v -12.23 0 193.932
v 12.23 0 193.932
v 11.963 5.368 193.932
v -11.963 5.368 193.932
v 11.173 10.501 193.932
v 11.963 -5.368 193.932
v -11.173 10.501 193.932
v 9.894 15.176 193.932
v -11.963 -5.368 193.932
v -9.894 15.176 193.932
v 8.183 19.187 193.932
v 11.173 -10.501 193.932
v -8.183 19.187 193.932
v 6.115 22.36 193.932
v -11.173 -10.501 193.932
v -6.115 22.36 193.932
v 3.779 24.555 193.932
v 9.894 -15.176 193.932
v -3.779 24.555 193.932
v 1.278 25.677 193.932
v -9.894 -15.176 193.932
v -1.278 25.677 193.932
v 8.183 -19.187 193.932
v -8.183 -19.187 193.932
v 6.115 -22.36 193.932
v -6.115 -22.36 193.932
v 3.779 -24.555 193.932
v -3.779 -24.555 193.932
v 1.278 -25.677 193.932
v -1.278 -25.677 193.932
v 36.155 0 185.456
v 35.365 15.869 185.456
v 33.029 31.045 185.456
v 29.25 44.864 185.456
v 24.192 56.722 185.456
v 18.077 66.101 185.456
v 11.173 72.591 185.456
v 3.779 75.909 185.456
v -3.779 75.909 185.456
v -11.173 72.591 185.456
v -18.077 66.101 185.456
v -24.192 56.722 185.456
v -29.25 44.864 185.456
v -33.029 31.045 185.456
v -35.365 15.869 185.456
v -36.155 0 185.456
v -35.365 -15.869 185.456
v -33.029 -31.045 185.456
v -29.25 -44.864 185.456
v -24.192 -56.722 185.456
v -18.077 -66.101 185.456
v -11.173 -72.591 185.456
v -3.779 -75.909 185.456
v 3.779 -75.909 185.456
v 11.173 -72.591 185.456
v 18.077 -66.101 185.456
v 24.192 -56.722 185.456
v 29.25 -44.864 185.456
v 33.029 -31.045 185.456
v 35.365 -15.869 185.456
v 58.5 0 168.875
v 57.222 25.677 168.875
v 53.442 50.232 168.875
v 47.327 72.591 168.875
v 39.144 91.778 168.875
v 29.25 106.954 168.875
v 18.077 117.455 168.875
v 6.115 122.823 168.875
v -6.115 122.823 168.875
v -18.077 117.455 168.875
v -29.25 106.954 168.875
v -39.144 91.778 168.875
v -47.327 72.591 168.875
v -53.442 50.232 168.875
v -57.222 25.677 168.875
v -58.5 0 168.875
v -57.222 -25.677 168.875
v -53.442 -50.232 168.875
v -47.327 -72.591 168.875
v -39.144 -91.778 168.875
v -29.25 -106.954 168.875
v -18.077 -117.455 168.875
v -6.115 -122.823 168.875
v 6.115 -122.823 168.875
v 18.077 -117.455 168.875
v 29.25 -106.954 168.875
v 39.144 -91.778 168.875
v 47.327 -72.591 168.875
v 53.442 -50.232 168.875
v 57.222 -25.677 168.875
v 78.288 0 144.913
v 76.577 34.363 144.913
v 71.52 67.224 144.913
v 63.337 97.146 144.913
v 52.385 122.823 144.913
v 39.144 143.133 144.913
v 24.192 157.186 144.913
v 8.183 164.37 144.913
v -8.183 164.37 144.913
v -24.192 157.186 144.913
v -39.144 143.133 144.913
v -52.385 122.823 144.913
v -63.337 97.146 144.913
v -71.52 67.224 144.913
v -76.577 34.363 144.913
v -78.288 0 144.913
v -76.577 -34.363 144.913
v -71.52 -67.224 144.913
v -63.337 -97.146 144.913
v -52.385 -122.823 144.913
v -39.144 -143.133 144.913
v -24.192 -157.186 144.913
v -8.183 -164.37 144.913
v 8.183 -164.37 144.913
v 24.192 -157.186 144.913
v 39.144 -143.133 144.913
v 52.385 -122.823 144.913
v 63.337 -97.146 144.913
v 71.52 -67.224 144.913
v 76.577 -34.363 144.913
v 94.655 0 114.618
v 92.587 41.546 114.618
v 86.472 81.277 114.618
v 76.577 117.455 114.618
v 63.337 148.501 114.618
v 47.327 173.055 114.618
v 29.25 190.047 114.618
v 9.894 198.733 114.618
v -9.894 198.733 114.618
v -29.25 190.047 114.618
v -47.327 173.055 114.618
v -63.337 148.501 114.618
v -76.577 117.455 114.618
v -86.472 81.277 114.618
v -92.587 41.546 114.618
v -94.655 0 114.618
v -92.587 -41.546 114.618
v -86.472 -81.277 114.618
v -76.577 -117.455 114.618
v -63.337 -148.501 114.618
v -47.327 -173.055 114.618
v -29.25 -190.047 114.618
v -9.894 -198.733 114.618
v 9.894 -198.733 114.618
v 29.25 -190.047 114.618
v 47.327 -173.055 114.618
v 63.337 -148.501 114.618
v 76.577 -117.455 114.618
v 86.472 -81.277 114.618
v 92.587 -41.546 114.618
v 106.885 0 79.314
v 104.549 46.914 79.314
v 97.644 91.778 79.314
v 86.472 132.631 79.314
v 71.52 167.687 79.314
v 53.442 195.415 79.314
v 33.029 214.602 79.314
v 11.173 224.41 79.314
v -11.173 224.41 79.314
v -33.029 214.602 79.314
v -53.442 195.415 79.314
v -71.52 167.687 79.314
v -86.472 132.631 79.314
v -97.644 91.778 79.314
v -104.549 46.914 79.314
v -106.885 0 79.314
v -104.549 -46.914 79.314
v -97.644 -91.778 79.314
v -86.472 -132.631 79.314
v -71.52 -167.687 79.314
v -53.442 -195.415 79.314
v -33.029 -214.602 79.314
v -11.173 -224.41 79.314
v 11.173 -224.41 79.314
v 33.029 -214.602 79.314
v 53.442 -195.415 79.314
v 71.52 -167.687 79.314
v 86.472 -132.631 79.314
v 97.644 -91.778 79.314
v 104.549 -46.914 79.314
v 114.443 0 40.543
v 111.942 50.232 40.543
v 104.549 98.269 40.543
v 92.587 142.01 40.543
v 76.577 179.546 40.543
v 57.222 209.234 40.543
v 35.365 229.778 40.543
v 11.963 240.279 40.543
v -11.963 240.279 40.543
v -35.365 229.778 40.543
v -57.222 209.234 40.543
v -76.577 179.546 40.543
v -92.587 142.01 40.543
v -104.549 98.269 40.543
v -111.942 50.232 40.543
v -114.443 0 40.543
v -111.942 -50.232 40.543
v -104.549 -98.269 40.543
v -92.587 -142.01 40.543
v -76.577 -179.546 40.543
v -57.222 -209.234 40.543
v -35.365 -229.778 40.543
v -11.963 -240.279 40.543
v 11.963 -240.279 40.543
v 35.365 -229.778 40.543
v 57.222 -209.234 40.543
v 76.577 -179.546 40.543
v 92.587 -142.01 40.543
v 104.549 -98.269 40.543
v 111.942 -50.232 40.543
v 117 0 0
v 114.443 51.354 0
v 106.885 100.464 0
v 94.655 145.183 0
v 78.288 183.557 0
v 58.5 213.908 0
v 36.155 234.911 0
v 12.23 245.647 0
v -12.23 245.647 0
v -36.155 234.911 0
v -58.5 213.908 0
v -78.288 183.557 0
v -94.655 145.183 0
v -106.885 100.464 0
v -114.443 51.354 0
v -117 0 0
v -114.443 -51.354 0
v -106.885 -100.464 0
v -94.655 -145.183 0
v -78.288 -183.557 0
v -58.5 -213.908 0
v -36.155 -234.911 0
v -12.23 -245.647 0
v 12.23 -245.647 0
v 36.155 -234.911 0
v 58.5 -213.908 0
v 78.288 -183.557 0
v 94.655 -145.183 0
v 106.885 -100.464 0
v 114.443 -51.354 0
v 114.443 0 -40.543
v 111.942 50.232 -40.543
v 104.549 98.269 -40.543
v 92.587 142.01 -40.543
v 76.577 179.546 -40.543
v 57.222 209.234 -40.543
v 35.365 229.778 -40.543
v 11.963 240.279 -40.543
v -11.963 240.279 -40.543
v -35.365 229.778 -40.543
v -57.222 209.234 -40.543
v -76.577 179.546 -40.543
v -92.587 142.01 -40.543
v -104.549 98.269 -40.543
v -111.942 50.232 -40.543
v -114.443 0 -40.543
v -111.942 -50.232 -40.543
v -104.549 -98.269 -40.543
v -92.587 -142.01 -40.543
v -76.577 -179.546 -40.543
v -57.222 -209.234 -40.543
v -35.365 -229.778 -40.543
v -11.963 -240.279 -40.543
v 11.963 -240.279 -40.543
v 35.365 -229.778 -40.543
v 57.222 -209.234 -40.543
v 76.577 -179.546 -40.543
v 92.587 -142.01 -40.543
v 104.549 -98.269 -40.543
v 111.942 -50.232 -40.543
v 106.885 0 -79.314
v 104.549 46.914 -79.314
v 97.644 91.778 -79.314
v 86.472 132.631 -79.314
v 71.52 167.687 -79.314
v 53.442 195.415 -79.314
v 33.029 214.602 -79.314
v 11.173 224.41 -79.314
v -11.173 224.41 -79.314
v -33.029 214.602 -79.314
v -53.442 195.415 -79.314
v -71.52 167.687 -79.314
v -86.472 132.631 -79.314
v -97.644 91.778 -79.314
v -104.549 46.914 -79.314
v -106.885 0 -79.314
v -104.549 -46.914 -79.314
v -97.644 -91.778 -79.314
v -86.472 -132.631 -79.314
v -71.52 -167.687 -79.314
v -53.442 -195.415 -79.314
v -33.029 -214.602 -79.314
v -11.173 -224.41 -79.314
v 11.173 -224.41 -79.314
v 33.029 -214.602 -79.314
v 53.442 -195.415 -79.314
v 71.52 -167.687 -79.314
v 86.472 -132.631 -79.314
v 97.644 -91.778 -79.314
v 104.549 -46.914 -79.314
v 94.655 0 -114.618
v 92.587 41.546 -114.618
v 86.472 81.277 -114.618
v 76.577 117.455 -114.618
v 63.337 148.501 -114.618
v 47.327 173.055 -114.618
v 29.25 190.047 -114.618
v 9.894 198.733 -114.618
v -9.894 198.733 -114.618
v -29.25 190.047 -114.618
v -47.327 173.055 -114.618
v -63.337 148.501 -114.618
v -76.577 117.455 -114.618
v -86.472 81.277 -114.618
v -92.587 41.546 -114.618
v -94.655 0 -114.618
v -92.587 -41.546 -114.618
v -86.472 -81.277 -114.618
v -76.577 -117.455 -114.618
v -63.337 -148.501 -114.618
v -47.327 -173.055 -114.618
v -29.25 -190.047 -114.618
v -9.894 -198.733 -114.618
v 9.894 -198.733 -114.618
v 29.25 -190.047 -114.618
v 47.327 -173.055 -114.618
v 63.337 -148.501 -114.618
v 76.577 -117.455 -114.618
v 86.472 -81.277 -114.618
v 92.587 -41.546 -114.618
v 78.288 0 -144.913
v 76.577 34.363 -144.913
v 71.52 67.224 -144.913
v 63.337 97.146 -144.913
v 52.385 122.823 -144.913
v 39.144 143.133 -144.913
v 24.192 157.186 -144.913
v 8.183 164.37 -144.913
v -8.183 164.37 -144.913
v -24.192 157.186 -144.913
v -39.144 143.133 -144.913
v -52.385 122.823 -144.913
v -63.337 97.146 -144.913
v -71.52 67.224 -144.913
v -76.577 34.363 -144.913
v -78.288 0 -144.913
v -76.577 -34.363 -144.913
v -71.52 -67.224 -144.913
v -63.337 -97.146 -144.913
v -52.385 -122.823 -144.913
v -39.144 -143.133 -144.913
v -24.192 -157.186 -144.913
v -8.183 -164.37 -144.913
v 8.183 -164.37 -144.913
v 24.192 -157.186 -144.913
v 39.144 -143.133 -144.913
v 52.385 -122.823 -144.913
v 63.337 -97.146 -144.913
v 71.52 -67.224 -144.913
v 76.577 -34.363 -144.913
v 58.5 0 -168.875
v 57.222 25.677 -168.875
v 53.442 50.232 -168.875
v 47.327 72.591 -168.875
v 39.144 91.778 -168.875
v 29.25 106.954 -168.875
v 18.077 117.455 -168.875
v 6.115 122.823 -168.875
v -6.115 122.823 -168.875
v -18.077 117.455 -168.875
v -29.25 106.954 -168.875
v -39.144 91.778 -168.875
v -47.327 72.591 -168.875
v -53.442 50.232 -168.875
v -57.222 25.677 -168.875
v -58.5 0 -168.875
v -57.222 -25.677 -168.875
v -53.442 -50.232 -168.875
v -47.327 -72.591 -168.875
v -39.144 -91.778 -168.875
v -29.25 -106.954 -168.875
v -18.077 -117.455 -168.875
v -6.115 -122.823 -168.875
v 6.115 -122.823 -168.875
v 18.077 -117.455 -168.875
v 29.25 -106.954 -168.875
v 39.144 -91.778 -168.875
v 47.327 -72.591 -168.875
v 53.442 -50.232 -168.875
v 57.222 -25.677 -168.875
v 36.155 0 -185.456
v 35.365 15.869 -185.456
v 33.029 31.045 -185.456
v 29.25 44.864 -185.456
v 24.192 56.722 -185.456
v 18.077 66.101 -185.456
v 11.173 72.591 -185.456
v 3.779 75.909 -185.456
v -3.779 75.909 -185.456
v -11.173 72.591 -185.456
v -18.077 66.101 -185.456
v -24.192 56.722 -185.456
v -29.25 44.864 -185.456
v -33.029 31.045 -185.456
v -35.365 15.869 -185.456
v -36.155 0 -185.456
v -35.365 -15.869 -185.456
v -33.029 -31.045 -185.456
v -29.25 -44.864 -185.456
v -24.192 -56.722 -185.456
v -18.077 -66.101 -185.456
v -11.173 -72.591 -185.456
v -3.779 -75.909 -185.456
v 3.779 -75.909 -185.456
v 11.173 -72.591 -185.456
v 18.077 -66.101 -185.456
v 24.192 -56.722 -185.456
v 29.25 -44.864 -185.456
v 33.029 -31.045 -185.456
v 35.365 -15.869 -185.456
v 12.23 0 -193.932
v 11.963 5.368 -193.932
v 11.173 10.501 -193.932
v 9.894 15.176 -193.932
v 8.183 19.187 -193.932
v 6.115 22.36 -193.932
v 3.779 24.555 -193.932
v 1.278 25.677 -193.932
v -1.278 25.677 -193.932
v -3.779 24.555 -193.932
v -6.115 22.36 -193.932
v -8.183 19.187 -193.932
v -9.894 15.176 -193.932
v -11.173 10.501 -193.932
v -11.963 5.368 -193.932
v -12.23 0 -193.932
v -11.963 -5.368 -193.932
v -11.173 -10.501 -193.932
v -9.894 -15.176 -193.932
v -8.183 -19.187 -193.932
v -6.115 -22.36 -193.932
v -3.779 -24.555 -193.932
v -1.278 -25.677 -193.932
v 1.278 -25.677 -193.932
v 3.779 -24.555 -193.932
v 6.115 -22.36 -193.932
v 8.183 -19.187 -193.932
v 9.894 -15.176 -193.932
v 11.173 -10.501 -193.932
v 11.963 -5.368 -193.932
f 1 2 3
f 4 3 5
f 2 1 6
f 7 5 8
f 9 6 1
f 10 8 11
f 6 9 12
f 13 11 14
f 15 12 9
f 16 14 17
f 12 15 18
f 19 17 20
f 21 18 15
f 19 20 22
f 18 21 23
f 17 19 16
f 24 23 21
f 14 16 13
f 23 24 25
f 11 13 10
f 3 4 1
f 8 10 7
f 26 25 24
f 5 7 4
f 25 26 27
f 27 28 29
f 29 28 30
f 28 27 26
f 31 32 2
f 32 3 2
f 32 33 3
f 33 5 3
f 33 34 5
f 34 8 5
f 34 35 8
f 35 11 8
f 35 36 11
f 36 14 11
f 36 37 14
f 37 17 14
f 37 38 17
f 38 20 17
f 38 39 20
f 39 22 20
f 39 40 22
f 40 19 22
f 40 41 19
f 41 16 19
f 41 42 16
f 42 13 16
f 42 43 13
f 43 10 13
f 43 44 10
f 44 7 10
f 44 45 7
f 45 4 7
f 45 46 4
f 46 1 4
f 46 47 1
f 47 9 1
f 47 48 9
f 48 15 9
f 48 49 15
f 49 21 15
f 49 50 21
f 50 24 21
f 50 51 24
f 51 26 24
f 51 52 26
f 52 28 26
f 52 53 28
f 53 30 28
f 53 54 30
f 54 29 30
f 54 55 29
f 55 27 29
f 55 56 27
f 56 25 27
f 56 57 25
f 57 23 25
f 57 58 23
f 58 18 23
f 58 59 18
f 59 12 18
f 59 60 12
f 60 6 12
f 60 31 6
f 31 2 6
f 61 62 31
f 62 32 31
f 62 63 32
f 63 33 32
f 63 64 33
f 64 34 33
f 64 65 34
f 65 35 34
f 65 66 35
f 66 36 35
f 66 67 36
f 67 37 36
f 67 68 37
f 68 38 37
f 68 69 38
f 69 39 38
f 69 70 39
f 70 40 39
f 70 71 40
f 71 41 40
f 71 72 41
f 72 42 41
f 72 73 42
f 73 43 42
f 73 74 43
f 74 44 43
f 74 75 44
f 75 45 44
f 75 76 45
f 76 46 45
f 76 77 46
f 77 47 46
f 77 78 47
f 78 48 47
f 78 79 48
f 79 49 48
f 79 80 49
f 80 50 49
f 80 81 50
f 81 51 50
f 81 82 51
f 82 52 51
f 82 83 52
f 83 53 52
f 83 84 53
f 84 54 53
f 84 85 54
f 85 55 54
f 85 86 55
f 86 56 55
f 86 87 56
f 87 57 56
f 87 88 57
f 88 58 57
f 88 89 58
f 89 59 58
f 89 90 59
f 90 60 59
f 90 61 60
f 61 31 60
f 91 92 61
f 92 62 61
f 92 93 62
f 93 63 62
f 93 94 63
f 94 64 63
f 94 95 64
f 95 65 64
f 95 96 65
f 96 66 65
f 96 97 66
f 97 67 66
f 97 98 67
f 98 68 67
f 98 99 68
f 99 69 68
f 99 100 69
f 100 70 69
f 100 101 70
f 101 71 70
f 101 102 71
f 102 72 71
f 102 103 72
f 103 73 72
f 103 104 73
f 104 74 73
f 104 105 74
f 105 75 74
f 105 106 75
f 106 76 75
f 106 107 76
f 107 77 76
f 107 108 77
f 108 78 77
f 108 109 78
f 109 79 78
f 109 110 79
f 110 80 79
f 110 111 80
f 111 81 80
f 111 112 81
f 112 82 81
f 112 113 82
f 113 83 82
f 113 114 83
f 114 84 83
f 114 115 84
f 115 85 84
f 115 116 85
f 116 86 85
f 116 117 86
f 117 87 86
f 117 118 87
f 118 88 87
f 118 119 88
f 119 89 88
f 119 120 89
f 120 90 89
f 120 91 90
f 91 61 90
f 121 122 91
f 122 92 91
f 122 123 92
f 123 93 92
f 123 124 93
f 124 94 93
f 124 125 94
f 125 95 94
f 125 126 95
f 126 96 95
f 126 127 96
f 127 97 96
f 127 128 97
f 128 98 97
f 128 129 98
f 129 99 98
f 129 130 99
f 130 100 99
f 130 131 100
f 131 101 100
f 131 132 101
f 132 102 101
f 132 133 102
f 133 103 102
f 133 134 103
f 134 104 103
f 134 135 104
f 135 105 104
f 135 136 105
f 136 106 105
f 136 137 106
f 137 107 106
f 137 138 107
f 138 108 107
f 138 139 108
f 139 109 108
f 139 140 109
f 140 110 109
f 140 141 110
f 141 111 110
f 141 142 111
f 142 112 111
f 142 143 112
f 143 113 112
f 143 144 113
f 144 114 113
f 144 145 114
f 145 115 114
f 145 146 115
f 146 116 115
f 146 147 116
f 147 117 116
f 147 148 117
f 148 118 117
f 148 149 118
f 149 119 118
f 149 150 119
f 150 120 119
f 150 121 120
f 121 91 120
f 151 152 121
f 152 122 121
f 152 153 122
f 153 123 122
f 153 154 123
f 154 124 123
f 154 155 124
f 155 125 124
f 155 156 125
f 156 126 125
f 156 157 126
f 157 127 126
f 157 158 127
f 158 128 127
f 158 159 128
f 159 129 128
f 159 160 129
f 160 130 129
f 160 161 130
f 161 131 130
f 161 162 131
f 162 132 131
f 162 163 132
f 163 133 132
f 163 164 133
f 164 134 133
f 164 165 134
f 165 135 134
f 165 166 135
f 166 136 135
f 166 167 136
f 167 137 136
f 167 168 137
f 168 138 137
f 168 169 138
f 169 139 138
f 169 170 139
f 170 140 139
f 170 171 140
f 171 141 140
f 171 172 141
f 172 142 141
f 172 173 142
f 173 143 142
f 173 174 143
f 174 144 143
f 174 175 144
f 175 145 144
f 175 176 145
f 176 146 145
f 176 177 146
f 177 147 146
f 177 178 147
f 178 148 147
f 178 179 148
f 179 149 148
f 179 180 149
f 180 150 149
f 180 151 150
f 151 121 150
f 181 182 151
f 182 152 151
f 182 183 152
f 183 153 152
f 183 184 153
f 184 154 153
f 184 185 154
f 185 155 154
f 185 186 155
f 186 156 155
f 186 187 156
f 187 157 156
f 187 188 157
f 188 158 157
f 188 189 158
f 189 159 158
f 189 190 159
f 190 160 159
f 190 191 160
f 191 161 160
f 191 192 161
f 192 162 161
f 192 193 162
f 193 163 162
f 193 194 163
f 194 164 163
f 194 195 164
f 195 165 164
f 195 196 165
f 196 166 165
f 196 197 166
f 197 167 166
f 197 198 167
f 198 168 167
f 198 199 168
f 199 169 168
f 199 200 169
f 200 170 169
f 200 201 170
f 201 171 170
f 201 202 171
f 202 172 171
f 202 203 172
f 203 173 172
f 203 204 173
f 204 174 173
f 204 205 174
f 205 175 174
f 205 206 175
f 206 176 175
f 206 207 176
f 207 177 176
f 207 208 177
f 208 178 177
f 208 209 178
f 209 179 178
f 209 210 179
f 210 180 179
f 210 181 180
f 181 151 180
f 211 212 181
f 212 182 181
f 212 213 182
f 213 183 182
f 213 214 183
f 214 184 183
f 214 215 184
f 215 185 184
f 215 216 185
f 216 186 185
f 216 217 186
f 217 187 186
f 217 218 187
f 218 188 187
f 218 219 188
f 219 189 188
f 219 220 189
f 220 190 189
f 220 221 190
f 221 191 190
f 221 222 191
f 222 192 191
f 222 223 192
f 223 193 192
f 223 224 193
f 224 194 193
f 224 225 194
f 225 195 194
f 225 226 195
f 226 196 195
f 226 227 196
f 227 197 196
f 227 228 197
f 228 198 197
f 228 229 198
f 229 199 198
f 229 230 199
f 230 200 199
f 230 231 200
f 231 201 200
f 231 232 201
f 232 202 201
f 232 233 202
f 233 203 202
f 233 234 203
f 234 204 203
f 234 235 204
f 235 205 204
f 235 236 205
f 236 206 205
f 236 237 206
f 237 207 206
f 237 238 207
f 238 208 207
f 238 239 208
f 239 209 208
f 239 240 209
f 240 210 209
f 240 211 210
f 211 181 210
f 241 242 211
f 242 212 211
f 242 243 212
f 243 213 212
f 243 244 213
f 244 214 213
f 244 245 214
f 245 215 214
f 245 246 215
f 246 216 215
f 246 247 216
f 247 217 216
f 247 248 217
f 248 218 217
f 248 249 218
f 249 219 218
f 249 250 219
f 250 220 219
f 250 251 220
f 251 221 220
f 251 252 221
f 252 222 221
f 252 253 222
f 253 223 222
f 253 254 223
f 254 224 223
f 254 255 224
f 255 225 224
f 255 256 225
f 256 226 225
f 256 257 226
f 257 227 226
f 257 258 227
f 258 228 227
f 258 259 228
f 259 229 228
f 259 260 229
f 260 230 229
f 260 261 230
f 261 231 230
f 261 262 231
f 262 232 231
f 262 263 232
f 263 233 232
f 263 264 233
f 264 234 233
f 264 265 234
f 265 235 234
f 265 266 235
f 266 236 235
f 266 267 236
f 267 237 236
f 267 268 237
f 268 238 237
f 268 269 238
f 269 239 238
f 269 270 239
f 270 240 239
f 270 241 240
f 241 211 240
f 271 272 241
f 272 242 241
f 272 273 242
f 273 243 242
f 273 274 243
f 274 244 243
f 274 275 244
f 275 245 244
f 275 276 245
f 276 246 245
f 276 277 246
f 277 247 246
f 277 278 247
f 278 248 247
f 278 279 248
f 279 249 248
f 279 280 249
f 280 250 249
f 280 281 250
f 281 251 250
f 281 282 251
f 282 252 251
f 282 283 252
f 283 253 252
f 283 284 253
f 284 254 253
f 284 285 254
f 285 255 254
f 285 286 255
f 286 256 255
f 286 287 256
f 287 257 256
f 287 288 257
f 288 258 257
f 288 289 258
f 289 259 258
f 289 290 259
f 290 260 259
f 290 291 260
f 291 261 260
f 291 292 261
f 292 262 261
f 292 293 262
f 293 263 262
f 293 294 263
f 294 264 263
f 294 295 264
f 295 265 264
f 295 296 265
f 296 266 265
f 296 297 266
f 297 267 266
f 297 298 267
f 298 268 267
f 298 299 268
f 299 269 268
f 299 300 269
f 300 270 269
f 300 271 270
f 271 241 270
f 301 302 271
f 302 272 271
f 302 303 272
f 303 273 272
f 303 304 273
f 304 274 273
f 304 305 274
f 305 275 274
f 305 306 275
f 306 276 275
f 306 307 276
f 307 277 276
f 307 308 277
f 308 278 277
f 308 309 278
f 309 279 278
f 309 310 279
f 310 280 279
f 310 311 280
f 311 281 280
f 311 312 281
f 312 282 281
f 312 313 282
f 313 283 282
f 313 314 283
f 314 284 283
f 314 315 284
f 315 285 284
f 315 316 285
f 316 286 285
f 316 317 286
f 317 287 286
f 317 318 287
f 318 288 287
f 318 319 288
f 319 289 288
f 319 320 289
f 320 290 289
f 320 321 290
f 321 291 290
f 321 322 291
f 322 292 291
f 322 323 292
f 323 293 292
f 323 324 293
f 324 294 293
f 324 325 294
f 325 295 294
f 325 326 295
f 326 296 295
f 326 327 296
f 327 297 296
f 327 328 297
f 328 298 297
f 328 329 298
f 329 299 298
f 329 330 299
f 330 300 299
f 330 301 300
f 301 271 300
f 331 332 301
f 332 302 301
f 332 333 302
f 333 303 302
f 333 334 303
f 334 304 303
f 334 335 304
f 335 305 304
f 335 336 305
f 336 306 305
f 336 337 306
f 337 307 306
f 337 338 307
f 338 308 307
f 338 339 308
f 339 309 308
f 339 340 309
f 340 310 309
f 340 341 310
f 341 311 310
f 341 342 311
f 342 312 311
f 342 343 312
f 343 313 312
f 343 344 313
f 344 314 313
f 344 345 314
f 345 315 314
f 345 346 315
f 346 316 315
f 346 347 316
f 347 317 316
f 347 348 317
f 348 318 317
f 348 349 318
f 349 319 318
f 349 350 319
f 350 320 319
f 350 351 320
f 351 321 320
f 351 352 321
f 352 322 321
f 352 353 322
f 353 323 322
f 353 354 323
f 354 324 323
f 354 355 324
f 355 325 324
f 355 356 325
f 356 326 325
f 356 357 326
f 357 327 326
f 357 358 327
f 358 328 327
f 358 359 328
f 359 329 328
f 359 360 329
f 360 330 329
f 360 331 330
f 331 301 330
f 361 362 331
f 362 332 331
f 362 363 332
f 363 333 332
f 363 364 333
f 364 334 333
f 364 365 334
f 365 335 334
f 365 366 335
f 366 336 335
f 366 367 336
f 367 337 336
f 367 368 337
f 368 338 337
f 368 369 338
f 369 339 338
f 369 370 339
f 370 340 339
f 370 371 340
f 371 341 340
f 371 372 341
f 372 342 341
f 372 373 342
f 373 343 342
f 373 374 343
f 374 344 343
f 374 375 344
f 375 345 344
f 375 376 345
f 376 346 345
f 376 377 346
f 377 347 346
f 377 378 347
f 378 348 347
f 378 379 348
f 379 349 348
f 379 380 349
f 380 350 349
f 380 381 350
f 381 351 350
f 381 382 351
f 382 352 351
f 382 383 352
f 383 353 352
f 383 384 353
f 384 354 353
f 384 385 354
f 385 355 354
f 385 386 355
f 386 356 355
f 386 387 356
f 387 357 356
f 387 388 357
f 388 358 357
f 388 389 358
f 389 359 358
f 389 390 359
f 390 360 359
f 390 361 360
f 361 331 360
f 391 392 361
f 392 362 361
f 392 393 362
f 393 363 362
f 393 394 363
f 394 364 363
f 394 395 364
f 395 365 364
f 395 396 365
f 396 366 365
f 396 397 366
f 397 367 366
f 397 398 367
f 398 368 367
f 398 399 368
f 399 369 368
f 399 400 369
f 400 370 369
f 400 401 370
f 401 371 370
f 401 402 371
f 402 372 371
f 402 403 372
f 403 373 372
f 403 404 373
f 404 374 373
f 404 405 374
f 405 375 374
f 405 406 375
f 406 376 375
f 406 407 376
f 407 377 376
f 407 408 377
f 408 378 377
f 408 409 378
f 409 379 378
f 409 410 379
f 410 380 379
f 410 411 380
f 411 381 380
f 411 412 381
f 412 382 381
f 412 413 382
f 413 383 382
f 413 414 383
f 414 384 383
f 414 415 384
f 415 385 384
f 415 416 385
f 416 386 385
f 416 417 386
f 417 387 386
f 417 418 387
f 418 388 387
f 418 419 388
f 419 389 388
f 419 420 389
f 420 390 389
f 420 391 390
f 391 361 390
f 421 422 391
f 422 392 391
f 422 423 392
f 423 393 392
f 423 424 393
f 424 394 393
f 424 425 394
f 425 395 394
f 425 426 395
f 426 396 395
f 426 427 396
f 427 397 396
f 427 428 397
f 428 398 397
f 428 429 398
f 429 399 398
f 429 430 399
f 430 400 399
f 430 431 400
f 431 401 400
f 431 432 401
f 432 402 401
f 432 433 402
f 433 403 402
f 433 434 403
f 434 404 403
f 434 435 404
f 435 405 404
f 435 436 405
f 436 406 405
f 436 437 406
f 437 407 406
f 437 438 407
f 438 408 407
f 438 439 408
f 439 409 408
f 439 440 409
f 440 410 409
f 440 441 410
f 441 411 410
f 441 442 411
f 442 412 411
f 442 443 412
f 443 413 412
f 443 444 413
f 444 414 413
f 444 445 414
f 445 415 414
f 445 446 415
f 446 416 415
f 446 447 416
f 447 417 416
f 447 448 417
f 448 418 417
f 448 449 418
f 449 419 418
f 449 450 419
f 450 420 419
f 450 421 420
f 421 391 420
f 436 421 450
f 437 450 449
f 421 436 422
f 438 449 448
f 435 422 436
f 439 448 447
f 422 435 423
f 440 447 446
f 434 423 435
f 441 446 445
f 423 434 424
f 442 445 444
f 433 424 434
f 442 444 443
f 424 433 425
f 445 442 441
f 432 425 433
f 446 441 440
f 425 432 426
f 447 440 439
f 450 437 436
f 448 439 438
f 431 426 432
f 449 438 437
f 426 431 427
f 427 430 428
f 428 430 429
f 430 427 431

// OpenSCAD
// Generated by SolidPython 1.0.1 on 2020-07-29 00:46:49


scale(v = [9, 19, 15]) {
	sphere(r = 13);
}
/***********************************************
*********      SolidPython code:      **********
************************************************
 
# import packages: SolidPython
from solid import *
from solid.utils import *
from itertools import chain, combinations, permutations


class Resize:

    def __init__(self, scad_file):
        self.scad_file = scad_file
        #self.scad_file = import_scad(scad_file)
        # cone/cylinder param:
        self.r1 = 0
        self.r2 = 0
        self.h = 0
        # rectangular prism param:
        self.w = 0
        self.l = 0
        # ellipse param:
        self.r = 0

    # import OpenScad code (file name corresponds to shape)


    # classify shape + parameters
    def assign(self, param1, param2, param3):
        if self.scad_file == 'cone.scad':
            self.r1 = param1
            self.r2 = param2
            self.h = param3
        elif self.scad_file == 'cylinder.scad':
            self.r1 = param1
            self.r2 = param2
            self.h = param3
        elif self.scad_file == 'rectangularPrism.scad':
            self.h = param1
            self.l = param2
            self.w = param3
        else:
            self.r = param1
            self.h = param2

    # resize parameters
    def iterate(self):
        x = range(3, 20, 2)
        i = 1
        if self.scad_file == 'cone.scad':
            tempList = list(permutations(x, 2))
            for temp in tempList:
                param1 = temp[0]
                param2 = temp[1]
                filepath = 'produced_scad_files/' + 'cone' + str(param1) + '_' + str(param2) + '_' + '.scad'
                scad_render_to_file(cylinder(h=param1, r1=param2, r2=0), filepath)

        elif self.scad_file == 'cylinder.scad':
            tempList = list(permutations(x, 3))
            for temp in tempList:
                param1 = temp[0]
                param2 = temp[1]
                filepath = 'produced_scad_files/' + 'cylinder' + str(param1) + '_' + str(param2) + '_' + '.scad'
                scad_render_to_file(cylinder(h=param1, r1=param2, r2=param2), filepath)

        elif self.scad_file == 'rectangularPrism.scad':
            tempList = list(permutations(x, 3))
            for temp in tempList:
                param1 = temp[0]
                param2 = temp[1]
                param3 = temp[2]
                filepath = 'produced_scad_files/' + 'rectangularPrism' + str(param1) + '_' + str(param2) + '_' + str(
                    param3) + '.scad'
                scad_render_to_file(cube(size=(param1, param2, param3)), filepath)

        elif self.scad_file == 'ellipse.scad':
            tempList = list(permutations(x, 4))
            for temp in tempList:
                param1 = temp[0]
                param2 = temp[1]
                param3 = temp[2]
                param4 = temp[3]
                filepath = 'produced_scad_files/' + 'ellipse' + str(param1) + '_' + str(param2) + '_' + str(param3) + '_' + str(param4) + '.scad'
                scad_render_to_file(scale([param1, param2, param3])(sphere(r=param4)), filepath)

    def render_to_scadfile(self):
        scad_render_to_file(scad, 'example.scad') 
 
************************************************/
